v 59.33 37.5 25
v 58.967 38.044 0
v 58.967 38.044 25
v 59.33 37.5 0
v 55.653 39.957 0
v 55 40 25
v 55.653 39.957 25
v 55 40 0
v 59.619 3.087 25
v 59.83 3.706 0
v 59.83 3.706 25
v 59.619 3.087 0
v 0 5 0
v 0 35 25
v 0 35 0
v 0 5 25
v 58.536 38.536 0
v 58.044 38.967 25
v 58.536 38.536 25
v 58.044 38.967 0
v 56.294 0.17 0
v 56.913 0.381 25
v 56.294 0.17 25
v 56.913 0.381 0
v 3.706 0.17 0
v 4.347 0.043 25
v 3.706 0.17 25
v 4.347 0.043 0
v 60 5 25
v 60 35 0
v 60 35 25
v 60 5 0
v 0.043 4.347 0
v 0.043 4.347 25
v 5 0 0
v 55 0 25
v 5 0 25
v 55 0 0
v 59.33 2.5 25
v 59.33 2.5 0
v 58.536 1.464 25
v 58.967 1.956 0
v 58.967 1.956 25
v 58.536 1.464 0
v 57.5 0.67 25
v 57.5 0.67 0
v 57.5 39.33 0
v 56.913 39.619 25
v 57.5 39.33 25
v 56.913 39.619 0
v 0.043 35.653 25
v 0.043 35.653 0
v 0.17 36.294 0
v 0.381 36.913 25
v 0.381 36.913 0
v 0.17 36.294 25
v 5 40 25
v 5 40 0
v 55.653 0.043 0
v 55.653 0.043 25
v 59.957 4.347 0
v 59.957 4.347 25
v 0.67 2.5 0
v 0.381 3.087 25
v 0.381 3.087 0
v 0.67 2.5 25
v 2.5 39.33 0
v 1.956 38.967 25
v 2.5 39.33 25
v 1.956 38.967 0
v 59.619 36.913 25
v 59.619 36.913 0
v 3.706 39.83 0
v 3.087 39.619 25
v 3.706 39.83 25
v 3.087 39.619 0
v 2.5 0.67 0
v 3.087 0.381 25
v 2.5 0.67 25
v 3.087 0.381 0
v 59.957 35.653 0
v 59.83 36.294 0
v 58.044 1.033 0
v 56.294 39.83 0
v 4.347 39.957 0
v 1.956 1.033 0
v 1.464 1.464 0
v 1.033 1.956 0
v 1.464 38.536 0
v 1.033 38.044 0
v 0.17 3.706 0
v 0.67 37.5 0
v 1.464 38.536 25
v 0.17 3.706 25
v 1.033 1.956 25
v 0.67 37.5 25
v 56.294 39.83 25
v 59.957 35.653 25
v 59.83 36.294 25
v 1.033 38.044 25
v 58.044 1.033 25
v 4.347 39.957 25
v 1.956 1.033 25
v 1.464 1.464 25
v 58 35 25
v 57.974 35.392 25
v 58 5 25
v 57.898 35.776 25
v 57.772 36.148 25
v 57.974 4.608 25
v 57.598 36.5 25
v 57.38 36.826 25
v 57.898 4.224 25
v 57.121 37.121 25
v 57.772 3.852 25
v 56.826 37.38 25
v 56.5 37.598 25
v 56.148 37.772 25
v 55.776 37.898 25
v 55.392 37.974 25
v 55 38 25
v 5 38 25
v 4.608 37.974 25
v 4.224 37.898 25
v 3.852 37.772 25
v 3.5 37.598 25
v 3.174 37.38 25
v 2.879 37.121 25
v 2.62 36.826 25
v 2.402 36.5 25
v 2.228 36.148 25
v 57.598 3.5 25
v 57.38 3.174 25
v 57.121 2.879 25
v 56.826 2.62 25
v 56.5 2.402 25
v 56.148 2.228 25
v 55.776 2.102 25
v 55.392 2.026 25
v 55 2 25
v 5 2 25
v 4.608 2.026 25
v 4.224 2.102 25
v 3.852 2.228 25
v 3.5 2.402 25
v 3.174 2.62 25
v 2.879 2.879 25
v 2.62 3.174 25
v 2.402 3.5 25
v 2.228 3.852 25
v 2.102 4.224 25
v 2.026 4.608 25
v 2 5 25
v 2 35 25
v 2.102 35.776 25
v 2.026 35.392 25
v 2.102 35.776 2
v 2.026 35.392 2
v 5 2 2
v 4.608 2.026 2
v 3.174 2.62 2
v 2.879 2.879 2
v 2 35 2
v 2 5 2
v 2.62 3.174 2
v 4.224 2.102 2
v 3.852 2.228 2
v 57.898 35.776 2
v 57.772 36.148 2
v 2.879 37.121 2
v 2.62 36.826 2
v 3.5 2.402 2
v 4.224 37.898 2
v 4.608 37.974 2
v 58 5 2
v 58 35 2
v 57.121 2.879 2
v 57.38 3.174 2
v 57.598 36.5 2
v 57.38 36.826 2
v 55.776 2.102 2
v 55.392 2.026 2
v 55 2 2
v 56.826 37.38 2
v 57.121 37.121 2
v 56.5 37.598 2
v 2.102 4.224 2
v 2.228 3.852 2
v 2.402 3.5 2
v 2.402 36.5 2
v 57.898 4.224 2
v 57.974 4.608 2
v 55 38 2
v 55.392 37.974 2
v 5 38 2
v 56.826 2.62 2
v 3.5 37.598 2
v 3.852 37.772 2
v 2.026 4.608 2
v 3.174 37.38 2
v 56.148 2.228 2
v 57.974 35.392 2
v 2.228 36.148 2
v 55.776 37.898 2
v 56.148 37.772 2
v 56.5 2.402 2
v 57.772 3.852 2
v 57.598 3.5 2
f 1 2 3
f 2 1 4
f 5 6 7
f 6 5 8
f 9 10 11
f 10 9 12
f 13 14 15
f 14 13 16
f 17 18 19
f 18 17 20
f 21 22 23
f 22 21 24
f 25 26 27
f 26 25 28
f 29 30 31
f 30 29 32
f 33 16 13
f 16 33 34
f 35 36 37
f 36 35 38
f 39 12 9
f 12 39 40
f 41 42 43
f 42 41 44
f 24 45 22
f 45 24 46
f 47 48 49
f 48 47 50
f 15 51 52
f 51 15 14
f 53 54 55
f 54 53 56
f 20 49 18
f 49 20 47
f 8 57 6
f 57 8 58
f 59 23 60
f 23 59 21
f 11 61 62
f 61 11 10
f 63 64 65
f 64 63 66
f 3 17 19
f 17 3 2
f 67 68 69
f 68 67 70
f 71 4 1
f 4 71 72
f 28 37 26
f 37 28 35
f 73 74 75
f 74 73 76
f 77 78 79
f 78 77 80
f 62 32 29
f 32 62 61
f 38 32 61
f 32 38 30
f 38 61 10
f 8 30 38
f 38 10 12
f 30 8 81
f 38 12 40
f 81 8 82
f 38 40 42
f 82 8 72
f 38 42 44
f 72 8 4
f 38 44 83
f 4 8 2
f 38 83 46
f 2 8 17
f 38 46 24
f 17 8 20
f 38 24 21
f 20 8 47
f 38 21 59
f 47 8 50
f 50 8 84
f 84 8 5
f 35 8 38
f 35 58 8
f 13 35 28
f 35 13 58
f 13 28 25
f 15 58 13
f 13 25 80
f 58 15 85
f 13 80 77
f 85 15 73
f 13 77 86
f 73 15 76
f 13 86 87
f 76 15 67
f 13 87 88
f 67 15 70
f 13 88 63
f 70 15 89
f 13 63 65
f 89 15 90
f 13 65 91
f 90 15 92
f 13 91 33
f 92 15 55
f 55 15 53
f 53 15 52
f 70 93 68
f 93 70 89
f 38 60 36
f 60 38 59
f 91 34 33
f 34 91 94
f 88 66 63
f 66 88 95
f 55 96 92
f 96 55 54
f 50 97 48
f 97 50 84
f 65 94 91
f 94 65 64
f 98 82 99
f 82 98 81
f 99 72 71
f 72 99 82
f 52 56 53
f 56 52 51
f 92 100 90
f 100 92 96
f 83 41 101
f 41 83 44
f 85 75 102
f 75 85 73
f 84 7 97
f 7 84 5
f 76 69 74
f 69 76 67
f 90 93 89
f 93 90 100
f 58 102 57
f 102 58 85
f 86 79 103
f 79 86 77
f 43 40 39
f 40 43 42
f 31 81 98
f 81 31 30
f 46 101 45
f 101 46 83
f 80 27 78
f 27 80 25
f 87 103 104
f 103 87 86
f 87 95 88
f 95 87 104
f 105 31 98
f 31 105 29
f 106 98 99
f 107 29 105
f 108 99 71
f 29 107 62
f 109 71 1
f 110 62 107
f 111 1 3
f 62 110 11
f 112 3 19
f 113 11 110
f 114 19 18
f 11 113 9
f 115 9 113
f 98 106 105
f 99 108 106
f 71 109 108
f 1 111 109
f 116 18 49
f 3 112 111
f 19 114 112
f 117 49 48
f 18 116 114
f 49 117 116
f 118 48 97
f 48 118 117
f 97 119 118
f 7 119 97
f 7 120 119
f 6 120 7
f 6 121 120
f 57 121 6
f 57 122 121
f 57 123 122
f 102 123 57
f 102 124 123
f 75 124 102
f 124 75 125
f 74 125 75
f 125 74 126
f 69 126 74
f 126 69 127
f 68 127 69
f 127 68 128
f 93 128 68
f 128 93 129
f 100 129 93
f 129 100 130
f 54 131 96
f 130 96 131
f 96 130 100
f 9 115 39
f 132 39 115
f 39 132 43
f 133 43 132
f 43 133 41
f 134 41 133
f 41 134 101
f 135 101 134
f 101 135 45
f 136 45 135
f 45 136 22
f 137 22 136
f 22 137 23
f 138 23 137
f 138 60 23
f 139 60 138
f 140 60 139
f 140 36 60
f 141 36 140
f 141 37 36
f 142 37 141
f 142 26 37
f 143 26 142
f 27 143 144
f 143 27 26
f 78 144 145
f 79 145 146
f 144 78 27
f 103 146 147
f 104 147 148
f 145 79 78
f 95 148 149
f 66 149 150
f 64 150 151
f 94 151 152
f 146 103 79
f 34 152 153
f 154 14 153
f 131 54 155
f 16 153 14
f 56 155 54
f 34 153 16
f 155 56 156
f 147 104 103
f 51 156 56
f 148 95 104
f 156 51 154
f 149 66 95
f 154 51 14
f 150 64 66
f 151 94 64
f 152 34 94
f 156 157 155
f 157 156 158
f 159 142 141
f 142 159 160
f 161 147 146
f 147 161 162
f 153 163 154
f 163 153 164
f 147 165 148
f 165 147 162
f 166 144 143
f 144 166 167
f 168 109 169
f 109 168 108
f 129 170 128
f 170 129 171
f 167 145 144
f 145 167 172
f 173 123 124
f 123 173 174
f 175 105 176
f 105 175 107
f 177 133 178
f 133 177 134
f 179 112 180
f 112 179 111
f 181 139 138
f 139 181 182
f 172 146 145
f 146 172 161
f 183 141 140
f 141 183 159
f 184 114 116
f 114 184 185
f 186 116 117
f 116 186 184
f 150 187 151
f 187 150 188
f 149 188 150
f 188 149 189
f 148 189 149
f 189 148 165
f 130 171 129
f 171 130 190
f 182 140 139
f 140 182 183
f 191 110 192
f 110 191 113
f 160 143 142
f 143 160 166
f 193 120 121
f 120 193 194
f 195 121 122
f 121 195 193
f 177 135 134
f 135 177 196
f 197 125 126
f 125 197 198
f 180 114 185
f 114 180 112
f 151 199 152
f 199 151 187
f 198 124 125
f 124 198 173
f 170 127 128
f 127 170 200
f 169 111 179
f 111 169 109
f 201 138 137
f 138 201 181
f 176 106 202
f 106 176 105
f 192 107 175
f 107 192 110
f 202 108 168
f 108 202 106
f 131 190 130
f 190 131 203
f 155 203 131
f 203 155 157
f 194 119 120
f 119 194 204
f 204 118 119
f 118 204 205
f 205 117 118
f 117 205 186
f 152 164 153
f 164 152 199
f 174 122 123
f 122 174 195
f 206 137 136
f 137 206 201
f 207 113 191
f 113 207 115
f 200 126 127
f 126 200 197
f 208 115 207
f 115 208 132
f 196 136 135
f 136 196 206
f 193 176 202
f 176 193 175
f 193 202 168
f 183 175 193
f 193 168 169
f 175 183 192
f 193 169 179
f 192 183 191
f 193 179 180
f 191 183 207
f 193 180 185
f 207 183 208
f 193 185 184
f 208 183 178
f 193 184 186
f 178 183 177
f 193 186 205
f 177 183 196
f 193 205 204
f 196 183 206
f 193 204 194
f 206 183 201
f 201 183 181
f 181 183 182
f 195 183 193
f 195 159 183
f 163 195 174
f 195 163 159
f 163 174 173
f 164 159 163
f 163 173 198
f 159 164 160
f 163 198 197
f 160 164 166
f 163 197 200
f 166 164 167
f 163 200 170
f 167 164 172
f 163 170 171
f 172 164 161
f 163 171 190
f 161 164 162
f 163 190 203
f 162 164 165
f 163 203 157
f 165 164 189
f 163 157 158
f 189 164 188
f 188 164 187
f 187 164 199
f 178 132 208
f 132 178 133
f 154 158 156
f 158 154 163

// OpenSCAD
// Example: box with rounded corners (dimensions in mm)
// The values at the top can be adjusted under "Sliders".

width  = 60;   // [20:150]
depth  = 40;   // [20:150]
height = 25;   // [5:80]
wall   = 2;    // [1:0.5:5]
radius = 5;    // [1:15]

$fn = 48;

module rounded(w, d, h, r) {
  hull() {
    for (x = [r, w - r], y = [r, d - r])
      translate([x, y, 0]) cylinder(h = h, r = r);
  }
}

difference() {
  rounded(width, depth, height, radius);
  translate([wall, wall, wall])
    rounded(width - 2 * wall, depth - 2 * wall, height, max(radius - wall, 0.5));
}
